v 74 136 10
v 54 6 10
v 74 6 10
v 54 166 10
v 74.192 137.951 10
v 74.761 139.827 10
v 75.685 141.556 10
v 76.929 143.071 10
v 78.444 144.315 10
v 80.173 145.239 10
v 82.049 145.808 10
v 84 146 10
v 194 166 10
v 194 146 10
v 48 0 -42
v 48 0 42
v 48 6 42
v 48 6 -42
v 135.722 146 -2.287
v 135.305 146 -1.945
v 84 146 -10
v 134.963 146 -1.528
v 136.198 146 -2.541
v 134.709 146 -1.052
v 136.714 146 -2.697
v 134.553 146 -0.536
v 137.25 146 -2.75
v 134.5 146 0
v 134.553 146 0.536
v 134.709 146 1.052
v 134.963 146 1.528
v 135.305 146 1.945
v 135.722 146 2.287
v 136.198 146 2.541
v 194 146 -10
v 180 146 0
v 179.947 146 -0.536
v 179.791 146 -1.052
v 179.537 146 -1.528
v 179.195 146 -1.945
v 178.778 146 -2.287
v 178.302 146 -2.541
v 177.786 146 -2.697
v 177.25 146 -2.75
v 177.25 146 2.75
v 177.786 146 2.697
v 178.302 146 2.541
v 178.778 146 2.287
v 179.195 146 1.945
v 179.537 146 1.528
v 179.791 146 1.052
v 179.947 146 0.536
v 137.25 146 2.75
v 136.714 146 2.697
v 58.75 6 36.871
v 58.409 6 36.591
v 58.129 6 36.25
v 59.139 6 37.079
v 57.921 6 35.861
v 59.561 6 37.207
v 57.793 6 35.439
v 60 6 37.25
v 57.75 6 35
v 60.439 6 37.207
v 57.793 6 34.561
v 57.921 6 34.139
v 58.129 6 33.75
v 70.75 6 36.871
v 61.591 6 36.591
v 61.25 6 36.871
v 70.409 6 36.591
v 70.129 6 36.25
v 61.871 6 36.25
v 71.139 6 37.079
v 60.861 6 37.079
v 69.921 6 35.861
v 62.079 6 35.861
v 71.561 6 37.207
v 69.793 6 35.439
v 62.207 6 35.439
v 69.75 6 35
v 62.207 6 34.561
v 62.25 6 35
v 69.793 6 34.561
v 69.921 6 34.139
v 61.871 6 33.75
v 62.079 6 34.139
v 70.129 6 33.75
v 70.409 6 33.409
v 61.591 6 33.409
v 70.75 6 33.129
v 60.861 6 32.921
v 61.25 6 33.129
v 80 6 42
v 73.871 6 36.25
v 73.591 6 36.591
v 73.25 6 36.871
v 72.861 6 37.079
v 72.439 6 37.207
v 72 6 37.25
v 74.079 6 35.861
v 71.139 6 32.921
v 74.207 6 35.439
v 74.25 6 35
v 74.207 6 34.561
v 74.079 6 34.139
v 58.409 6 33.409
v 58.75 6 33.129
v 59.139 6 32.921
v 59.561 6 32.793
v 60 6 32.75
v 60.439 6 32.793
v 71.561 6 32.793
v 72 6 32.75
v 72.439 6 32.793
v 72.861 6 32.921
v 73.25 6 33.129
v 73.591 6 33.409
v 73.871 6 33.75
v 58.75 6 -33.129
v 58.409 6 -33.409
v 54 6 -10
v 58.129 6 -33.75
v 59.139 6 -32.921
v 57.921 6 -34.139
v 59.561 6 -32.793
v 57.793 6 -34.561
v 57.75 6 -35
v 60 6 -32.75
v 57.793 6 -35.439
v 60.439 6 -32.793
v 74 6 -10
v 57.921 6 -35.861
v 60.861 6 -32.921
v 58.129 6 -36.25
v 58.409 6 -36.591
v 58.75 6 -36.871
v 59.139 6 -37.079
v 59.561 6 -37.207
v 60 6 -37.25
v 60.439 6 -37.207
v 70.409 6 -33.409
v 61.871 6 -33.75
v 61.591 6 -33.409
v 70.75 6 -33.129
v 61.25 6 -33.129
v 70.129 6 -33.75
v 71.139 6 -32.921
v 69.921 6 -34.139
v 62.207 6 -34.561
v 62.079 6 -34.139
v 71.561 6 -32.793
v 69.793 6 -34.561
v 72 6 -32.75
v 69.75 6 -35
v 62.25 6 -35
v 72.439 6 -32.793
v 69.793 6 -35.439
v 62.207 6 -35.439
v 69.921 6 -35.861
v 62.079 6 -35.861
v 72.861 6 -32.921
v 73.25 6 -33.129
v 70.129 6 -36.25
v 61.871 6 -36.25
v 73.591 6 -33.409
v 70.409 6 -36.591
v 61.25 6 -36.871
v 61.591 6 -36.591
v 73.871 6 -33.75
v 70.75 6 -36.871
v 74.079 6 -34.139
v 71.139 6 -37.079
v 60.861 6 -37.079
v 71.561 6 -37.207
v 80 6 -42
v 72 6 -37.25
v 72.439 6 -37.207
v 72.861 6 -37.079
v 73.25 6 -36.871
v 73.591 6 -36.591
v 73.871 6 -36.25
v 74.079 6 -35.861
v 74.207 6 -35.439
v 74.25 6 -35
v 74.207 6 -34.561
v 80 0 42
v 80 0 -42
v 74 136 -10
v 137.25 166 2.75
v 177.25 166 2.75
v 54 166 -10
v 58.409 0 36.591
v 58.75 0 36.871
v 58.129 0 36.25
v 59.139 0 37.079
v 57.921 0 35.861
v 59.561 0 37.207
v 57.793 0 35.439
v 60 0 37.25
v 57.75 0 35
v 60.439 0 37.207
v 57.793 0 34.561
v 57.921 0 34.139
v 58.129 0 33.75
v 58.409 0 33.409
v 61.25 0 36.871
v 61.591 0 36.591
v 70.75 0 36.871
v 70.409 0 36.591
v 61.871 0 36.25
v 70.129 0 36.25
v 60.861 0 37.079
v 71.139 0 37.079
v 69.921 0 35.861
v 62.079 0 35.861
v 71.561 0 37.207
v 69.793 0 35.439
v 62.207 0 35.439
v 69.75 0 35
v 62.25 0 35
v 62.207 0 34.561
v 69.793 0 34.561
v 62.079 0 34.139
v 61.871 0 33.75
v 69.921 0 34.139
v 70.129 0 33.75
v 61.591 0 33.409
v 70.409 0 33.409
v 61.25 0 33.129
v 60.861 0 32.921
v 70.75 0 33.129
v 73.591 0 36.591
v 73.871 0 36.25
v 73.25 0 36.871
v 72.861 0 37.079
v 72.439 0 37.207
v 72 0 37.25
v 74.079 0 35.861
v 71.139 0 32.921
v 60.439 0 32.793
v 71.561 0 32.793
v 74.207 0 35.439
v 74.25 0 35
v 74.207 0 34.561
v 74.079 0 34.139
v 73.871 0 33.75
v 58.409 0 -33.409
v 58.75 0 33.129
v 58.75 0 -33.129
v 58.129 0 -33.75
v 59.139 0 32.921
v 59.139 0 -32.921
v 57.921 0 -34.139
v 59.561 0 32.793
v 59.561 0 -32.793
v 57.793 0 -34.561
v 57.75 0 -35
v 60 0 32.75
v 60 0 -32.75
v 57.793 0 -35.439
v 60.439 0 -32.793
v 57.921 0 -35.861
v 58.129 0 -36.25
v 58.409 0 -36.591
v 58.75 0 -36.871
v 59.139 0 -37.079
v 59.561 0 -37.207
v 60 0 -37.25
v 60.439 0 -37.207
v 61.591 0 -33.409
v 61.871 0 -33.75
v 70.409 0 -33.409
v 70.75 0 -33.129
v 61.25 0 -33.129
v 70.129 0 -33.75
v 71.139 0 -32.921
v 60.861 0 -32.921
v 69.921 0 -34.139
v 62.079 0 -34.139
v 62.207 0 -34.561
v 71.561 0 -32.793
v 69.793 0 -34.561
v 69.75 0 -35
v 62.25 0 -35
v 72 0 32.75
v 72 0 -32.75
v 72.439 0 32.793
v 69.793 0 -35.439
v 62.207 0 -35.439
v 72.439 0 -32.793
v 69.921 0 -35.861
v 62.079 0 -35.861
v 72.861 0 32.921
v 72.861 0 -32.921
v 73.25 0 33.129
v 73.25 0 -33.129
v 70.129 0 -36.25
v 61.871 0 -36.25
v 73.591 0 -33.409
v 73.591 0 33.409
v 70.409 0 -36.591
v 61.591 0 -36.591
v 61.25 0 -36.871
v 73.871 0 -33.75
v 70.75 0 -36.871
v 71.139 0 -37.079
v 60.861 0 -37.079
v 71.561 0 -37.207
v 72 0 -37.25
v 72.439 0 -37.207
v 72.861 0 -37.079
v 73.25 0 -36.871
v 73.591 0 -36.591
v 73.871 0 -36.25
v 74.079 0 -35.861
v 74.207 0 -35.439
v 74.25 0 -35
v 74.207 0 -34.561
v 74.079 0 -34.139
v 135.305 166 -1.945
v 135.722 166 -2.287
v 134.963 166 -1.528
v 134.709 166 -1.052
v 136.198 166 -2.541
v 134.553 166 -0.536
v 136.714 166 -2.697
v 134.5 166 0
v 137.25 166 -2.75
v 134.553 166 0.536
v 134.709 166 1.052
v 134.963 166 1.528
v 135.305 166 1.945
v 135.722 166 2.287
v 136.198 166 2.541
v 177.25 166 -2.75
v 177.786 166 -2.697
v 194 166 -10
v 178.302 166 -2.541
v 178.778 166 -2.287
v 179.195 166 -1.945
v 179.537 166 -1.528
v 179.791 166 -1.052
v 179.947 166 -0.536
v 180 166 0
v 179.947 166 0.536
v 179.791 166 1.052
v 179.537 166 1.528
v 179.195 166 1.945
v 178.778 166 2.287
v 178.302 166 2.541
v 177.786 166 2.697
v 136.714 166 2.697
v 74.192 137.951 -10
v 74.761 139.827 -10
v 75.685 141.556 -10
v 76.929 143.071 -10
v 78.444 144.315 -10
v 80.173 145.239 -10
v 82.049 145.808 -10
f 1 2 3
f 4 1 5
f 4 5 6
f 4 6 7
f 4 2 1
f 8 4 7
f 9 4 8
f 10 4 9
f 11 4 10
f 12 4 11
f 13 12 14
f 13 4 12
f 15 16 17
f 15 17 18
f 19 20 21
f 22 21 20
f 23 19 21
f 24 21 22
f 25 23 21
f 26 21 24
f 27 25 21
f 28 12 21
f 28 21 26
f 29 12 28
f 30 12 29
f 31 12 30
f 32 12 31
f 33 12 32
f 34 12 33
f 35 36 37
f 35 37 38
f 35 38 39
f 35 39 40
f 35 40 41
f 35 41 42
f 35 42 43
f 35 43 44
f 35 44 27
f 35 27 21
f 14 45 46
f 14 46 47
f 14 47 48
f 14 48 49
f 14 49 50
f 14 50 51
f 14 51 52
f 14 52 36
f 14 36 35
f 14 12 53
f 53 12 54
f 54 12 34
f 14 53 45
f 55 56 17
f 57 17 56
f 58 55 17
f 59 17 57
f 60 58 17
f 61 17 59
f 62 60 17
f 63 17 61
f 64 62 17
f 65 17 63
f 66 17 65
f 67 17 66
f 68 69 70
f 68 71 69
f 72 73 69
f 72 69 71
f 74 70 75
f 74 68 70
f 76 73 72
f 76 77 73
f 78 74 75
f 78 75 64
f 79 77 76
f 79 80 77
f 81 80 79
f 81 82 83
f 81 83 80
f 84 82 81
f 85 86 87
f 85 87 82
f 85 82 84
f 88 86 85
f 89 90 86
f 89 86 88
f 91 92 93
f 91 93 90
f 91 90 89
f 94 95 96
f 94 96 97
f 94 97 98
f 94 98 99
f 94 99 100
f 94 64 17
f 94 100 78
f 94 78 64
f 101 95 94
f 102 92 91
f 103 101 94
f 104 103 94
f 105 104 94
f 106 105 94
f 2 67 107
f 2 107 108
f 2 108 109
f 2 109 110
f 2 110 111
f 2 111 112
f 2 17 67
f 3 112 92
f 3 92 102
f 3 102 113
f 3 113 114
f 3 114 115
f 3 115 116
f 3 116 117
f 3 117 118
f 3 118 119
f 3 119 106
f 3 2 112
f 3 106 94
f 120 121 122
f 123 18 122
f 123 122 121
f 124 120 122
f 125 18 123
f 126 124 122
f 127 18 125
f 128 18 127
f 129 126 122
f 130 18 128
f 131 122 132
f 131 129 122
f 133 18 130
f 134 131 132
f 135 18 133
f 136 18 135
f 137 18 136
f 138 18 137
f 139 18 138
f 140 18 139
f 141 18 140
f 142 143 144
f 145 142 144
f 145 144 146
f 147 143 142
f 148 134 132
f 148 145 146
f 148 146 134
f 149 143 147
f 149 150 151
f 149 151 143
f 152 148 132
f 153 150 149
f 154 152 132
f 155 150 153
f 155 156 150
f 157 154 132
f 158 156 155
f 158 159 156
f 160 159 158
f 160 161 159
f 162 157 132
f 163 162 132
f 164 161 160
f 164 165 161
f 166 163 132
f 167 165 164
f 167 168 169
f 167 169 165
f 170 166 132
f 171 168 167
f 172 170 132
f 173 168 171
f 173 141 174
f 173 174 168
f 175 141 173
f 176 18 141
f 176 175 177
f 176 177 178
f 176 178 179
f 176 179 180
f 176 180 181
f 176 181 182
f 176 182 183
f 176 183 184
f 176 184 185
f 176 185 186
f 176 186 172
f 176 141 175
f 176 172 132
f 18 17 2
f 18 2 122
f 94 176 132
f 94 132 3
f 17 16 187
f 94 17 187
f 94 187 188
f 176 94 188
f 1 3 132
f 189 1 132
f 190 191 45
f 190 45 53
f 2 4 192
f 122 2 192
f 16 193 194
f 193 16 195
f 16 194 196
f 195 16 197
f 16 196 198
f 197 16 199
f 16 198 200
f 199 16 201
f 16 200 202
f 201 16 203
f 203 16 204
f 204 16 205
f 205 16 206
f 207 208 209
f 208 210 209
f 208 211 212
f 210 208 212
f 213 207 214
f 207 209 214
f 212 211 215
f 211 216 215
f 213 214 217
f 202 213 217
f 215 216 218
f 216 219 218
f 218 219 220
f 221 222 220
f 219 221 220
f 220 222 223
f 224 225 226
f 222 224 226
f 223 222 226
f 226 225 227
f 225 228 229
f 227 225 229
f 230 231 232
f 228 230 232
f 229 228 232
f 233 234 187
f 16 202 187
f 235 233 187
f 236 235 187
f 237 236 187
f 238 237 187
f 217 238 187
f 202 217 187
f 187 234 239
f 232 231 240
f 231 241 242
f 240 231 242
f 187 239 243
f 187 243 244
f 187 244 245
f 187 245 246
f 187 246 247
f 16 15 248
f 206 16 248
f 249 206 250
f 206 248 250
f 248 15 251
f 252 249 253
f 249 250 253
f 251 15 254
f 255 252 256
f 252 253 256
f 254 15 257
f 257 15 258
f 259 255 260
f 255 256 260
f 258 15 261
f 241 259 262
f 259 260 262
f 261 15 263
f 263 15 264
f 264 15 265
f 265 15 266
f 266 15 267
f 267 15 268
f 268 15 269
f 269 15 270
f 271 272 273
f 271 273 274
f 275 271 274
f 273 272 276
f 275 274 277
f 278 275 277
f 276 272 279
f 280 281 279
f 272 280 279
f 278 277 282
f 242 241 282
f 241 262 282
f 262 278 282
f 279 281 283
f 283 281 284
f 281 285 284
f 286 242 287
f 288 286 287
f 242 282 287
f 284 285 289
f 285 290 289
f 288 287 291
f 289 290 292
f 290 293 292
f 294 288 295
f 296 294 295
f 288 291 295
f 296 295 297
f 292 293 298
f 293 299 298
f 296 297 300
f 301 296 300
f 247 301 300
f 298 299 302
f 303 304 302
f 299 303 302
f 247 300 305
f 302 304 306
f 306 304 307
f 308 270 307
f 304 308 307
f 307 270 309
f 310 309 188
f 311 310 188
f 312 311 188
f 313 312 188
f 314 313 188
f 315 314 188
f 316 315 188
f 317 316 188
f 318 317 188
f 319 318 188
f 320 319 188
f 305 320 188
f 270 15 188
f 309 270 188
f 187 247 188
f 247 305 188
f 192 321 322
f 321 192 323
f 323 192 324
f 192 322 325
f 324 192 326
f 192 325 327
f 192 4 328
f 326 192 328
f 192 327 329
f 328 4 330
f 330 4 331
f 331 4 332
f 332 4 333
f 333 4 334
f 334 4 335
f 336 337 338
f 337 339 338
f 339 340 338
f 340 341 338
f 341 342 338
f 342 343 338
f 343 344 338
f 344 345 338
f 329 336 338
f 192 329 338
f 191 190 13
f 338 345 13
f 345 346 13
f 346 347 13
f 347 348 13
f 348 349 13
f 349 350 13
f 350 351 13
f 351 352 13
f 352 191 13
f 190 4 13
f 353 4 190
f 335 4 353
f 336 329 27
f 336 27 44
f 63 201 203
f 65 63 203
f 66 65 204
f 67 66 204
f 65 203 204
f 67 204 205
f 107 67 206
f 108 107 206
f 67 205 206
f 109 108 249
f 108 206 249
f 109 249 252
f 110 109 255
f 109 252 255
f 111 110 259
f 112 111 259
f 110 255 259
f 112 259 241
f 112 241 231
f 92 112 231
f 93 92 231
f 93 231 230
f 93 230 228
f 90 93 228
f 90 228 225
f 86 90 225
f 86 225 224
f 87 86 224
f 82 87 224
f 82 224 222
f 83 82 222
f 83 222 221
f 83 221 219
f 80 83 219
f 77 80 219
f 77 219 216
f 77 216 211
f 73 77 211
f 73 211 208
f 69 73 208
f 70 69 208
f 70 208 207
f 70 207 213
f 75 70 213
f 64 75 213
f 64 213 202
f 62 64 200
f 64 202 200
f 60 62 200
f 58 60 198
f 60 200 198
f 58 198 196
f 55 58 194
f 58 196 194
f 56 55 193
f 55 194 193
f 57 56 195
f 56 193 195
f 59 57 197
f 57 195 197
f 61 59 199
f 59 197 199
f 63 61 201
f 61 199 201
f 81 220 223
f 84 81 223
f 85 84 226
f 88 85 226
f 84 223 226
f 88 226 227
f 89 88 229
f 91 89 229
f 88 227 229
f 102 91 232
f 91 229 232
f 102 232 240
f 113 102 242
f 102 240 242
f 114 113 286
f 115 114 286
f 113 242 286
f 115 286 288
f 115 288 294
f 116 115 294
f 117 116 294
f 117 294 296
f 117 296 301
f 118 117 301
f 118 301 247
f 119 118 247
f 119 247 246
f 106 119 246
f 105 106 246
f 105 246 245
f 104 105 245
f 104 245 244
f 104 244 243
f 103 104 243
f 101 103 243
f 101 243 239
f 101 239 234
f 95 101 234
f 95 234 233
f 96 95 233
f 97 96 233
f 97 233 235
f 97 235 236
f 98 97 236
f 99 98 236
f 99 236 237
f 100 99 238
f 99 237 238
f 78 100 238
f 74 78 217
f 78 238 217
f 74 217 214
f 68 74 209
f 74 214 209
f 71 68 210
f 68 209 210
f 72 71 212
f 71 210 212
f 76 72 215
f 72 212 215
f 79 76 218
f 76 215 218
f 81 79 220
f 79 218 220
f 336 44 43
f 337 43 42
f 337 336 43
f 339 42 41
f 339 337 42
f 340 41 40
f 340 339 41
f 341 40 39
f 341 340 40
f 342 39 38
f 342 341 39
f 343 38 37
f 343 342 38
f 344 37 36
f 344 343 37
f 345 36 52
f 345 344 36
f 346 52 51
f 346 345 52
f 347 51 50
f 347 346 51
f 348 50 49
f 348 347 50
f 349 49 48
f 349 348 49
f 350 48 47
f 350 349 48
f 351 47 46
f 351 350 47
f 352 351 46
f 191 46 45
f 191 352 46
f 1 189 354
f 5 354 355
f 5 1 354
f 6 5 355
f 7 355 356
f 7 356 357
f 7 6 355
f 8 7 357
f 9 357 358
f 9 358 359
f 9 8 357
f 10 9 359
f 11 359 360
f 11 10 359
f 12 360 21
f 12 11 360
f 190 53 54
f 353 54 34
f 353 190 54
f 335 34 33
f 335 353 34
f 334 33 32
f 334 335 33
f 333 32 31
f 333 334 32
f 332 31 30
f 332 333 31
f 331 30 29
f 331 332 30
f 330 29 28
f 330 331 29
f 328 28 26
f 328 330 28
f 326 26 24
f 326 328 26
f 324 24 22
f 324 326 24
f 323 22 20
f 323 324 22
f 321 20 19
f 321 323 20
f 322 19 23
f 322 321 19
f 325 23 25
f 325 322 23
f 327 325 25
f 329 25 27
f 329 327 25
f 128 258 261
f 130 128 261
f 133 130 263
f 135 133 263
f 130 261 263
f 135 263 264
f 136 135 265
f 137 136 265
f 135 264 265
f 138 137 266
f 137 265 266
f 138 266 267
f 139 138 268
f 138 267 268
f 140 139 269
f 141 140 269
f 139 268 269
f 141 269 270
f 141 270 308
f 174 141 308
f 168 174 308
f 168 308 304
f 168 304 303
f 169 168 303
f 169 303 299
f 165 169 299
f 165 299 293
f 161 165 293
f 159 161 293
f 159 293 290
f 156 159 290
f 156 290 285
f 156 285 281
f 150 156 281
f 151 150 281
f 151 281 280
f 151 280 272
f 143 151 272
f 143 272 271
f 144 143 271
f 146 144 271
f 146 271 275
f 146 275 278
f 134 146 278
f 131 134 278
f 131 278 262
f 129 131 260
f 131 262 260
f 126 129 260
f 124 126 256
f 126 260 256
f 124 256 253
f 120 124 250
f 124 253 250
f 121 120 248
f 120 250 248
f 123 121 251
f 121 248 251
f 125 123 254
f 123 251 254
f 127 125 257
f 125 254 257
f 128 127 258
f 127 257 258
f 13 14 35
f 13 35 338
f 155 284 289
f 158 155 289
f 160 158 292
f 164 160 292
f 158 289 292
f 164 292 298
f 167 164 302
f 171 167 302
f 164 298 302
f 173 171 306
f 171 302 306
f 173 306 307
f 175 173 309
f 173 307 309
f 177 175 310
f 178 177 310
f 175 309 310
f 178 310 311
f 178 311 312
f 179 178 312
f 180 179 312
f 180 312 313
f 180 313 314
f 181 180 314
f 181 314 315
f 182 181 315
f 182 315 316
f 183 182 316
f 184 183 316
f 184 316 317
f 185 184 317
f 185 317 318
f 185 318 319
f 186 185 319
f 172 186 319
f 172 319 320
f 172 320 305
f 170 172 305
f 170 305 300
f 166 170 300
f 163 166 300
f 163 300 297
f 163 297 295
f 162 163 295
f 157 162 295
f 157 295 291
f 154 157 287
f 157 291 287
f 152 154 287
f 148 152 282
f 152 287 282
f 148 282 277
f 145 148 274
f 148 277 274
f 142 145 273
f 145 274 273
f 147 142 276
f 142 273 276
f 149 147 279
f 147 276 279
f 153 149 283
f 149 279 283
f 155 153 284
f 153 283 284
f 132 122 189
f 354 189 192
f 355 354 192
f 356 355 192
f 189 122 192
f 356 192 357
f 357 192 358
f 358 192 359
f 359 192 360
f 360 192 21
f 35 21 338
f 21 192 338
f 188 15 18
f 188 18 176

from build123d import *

# Parameters (mm, degrees)
SKETCH2_W                       = 32
SKETCH2_H                       = 84
STALK_FLANGE_32X84X6_DEPTH      = 6
F_4_5_4_5_DIAMETER_HOLE1_D      = 4.5
SKETCH5_W                       = 20
SKETCH5_H                       = 20
VERTICAL_COLUMN_20X20X160_DEPTH = 160
SKETCH6_W                       = 120
SKETCH6_H                       = 20
HORIZONTAL_ARM_20X20X120_DEPTH  = 10
INSIDE_FILLET_R10_R             = 10
TIP_SLOT_40X5_5_THRU_DEPTH      = 259.758574737


with BuildPart() as part:
    # Sketch2 → Stalk_Flange_32x84x6 (new body)
    with BuildSketch(Plane(origin=(0, 0, 0), x_dir=(1, 0, 0), z_dir=(0, 1, 0))):
        with Locations((64, 0)):
            Rectangle(SKETCH2_W, SKETCH2_H)
    extrude(amount=STALK_FLANGE_32X84X6_DEPTH)

    # Ø4.5 (4.5) Diameter Hole1 (through all)
    with Locations(Plane(origin=(0, 6, 0), x_dir=(1, 0, 0), z_dir=(0, 1, 0))):
        with Locations((60, 35), (72, 35), (60, -35), (72, -35)):
            Hole(F_4_5_4_5_DIAMETER_HOLE1_D / 2)

    # Sketch5 → Vertical_Column_20x20x160 (add)
    with BuildSketch(Plane(origin=(0, 6, 0), x_dir=(1, 0, 0), z_dir=(0, 1, 0))):
        with Locations((64, 0)):
            Rectangle(SKETCH5_W, SKETCH5_H)
    extrude(amount=VERTICAL_COLUMN_20X20X160_DEPTH)

    # Sketch6 → Horizontal_Arm_20x20x120 (add, symmetric)
    with BuildSketch(Plane.XY):
        with Locations((134, 156)):
            Rectangle(SKETCH6_W, SKETCH6_H)
    extrude(amount=HORIZONTAL_ARM_20X20X120_DEPTH, both=True)

    # Inside_Fillet_R10
    inside_fillet_r10_edges = [part.edges().sort_by_distance(p)[0] for p in [
        (74, 146, 0),
    ]]
    fillet(inside_fillet_r10_edges, radius=INSIDE_FILLET_R10_R)

    # Sketch7 → Tip_Slot_40x5.5_THRU (cut, through all)
    with BuildSketch(Plane(origin=(0, 166, 0), x_dir=(1, 0, 0), z_dir=(0, 1, 0))):
        with BuildLine():
            Line((177.25, -2.75), (137.25, -2.75))
            ThreePointArc((137.25, -2.75), (134.5, 0), (137.25, 2.75))
            Line((137.25, 2.75), (177.25, 2.75))
            ThreePointArc((177.25, 2.75), (180, 0), (177.25, -2.75))
        make_face()
    extrude(amount=-TIP_SLOT_40X5_5_THRU_DEPTH, mode=Mode.SUBTRACT)


solid = part.part
